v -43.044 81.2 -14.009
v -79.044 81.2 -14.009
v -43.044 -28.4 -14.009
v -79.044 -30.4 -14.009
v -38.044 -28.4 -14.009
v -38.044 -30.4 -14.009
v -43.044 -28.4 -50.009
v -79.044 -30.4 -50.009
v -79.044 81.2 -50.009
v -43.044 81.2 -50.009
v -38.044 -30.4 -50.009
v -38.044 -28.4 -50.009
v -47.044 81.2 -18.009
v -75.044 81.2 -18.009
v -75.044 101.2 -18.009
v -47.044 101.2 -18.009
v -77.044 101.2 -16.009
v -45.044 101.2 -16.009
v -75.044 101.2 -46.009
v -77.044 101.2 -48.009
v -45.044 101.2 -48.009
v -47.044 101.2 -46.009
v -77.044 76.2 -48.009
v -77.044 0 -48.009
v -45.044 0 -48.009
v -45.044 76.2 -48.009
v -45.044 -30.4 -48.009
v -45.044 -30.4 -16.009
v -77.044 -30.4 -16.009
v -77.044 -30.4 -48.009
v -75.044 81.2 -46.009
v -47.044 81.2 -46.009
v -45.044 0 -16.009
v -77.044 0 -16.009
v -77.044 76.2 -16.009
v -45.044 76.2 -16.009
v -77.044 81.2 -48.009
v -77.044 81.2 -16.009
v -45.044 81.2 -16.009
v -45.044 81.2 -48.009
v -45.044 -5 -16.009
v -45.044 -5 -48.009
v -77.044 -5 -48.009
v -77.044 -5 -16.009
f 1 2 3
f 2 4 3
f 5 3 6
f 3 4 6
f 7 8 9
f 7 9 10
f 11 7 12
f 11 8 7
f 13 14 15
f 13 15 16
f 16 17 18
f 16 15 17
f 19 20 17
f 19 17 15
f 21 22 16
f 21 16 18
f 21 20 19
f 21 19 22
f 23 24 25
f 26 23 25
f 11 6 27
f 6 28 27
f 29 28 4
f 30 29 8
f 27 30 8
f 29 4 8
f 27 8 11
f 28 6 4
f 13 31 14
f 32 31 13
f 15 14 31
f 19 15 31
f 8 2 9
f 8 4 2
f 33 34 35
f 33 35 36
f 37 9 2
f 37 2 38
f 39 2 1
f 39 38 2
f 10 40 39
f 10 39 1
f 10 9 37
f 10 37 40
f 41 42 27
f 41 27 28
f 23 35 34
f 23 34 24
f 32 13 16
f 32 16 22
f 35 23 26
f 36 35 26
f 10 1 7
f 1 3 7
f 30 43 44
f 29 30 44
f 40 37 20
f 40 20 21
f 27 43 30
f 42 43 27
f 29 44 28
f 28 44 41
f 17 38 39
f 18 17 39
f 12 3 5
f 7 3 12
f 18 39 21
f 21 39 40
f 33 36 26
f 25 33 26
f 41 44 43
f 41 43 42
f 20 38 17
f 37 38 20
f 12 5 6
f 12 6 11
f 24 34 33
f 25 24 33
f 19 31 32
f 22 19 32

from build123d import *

# Parameters (mm, degrees)
SKETCH1_W           = 36
SKETCH1_H           = 36
SKETCH1_W_2         = 32
SKETCH1_H_2         = 32
BOSS_EXTRUDE1_DEPTH = 76.2
SKETCH2_W           = 36
SKETCH2_H           = 36
BOSS_EXTRUDE2_DEPTH = 5
SKETCH3_W           = 36
SKETCH3_H           = 36
SKETCH3_W_2         = 32
SKETCH3_H_2         = 32
BOSS_EXTRUDE3_DEPTH = 25.4
SKETCH4_W           = 36
SKETCH4_H           = 2
BOSS_EXTRUDE4_DEPTH = 5
SKETCH5_W           = 36
SKETCH5_H           = 36
BOSS_EXTRUDE5_DEPTH = 5
SKETCH6_W           = 32
SKETCH6_H           = 32
SKETCH6_W_2         = 28
SKETCH6_H_2         = 28
BOSS_EXTRUDE6_DEPTH = 20


with BuildPart() as part:
    # Sketch1 → Boss-Extrude1 (new body)
    with BuildSketch(Plane(origin=(0, 0, 0), x_dir=(1, 0, 0), z_dir=(0, 1, 0))):
        with Locations((-61.04447382, 32.009277239)):
            Rectangle(SKETCH1_W, SKETCH1_H)
        with Locations((-61.04447382, 32.009277239)):
            Rectangle(SKETCH1_W_2, SKETCH1_H_2, mode=Mode.SUBTRACT)
    extrude(amount=BOSS_EXTRUDE1_DEPTH)

    # Sketch2 → Boss-Extrude2 (add)
    with BuildSketch(Plane.XZ):
        with Locations((-61.04447382, -32.009277239)):
            Rectangle(SKETCH2_W, SKETCH2_H)
    extrude(amount=BOSS_EXTRUDE2_DEPTH)

    # Sketch3 → Boss-Extrude3 (add)
    with BuildSketch(Plane.XZ.offset(5)):
        with Locations((-61.04447382, -32.009277239)):
            Rectangle(SKETCH3_W, SKETCH3_H)
        with Locations((-61.04447382, -32.009277239)):
            Rectangle(SKETCH3_W_2, SKETCH3_H_2, mode=Mode.SUBTRACT)
    extrude(amount=BOSS_EXTRUDE3_DEPTH)

    # Sketch4 → Boss-Extrude4 (add)
    with BuildSketch(Plane(origin=(-43.04447382, 0, 0), x_dir=(0, 0, -1), z_dir=(1, 0, 0))):
        with Locations((32.009277239, -29.4)):
            Rectangle(SKETCH4_W, SKETCH4_H)
    extrude(amount=BOSS_EXTRUDE4_DEPTH)

    # Sketch5 → Boss-Extrude5 (add)
    with BuildSketch(Plane(origin=(0, 76.2, 0), x_dir=(1, 0, 0), z_dir=(0, 1, 0))):
        with Locations((-61.04447382, 32.009277239)):
            Rectangle(SKETCH5_W, SKETCH5_H)
    extrude(amount=BOSS_EXTRUDE5_DEPTH)

    # Sketch6 → Boss-Extrude6 (add)
    with BuildSketch(Plane(origin=(0, 81.2, 0), x_dir=(1, 0, 0), z_dir=(0, 1, 0))):
        with Locations((-61.04447382, 32.009277239)):
            Rectangle(SKETCH6_W, SKETCH6_H)
        with Locations((-61.04447382, 32.009277239)):
            Rectangle(SKETCH6_W_2, SKETCH6_H_2, mode=Mode.SUBTRACT)
    extrude(amount=BOSS_EXTRUDE6_DEPTH)


solid = part.part
